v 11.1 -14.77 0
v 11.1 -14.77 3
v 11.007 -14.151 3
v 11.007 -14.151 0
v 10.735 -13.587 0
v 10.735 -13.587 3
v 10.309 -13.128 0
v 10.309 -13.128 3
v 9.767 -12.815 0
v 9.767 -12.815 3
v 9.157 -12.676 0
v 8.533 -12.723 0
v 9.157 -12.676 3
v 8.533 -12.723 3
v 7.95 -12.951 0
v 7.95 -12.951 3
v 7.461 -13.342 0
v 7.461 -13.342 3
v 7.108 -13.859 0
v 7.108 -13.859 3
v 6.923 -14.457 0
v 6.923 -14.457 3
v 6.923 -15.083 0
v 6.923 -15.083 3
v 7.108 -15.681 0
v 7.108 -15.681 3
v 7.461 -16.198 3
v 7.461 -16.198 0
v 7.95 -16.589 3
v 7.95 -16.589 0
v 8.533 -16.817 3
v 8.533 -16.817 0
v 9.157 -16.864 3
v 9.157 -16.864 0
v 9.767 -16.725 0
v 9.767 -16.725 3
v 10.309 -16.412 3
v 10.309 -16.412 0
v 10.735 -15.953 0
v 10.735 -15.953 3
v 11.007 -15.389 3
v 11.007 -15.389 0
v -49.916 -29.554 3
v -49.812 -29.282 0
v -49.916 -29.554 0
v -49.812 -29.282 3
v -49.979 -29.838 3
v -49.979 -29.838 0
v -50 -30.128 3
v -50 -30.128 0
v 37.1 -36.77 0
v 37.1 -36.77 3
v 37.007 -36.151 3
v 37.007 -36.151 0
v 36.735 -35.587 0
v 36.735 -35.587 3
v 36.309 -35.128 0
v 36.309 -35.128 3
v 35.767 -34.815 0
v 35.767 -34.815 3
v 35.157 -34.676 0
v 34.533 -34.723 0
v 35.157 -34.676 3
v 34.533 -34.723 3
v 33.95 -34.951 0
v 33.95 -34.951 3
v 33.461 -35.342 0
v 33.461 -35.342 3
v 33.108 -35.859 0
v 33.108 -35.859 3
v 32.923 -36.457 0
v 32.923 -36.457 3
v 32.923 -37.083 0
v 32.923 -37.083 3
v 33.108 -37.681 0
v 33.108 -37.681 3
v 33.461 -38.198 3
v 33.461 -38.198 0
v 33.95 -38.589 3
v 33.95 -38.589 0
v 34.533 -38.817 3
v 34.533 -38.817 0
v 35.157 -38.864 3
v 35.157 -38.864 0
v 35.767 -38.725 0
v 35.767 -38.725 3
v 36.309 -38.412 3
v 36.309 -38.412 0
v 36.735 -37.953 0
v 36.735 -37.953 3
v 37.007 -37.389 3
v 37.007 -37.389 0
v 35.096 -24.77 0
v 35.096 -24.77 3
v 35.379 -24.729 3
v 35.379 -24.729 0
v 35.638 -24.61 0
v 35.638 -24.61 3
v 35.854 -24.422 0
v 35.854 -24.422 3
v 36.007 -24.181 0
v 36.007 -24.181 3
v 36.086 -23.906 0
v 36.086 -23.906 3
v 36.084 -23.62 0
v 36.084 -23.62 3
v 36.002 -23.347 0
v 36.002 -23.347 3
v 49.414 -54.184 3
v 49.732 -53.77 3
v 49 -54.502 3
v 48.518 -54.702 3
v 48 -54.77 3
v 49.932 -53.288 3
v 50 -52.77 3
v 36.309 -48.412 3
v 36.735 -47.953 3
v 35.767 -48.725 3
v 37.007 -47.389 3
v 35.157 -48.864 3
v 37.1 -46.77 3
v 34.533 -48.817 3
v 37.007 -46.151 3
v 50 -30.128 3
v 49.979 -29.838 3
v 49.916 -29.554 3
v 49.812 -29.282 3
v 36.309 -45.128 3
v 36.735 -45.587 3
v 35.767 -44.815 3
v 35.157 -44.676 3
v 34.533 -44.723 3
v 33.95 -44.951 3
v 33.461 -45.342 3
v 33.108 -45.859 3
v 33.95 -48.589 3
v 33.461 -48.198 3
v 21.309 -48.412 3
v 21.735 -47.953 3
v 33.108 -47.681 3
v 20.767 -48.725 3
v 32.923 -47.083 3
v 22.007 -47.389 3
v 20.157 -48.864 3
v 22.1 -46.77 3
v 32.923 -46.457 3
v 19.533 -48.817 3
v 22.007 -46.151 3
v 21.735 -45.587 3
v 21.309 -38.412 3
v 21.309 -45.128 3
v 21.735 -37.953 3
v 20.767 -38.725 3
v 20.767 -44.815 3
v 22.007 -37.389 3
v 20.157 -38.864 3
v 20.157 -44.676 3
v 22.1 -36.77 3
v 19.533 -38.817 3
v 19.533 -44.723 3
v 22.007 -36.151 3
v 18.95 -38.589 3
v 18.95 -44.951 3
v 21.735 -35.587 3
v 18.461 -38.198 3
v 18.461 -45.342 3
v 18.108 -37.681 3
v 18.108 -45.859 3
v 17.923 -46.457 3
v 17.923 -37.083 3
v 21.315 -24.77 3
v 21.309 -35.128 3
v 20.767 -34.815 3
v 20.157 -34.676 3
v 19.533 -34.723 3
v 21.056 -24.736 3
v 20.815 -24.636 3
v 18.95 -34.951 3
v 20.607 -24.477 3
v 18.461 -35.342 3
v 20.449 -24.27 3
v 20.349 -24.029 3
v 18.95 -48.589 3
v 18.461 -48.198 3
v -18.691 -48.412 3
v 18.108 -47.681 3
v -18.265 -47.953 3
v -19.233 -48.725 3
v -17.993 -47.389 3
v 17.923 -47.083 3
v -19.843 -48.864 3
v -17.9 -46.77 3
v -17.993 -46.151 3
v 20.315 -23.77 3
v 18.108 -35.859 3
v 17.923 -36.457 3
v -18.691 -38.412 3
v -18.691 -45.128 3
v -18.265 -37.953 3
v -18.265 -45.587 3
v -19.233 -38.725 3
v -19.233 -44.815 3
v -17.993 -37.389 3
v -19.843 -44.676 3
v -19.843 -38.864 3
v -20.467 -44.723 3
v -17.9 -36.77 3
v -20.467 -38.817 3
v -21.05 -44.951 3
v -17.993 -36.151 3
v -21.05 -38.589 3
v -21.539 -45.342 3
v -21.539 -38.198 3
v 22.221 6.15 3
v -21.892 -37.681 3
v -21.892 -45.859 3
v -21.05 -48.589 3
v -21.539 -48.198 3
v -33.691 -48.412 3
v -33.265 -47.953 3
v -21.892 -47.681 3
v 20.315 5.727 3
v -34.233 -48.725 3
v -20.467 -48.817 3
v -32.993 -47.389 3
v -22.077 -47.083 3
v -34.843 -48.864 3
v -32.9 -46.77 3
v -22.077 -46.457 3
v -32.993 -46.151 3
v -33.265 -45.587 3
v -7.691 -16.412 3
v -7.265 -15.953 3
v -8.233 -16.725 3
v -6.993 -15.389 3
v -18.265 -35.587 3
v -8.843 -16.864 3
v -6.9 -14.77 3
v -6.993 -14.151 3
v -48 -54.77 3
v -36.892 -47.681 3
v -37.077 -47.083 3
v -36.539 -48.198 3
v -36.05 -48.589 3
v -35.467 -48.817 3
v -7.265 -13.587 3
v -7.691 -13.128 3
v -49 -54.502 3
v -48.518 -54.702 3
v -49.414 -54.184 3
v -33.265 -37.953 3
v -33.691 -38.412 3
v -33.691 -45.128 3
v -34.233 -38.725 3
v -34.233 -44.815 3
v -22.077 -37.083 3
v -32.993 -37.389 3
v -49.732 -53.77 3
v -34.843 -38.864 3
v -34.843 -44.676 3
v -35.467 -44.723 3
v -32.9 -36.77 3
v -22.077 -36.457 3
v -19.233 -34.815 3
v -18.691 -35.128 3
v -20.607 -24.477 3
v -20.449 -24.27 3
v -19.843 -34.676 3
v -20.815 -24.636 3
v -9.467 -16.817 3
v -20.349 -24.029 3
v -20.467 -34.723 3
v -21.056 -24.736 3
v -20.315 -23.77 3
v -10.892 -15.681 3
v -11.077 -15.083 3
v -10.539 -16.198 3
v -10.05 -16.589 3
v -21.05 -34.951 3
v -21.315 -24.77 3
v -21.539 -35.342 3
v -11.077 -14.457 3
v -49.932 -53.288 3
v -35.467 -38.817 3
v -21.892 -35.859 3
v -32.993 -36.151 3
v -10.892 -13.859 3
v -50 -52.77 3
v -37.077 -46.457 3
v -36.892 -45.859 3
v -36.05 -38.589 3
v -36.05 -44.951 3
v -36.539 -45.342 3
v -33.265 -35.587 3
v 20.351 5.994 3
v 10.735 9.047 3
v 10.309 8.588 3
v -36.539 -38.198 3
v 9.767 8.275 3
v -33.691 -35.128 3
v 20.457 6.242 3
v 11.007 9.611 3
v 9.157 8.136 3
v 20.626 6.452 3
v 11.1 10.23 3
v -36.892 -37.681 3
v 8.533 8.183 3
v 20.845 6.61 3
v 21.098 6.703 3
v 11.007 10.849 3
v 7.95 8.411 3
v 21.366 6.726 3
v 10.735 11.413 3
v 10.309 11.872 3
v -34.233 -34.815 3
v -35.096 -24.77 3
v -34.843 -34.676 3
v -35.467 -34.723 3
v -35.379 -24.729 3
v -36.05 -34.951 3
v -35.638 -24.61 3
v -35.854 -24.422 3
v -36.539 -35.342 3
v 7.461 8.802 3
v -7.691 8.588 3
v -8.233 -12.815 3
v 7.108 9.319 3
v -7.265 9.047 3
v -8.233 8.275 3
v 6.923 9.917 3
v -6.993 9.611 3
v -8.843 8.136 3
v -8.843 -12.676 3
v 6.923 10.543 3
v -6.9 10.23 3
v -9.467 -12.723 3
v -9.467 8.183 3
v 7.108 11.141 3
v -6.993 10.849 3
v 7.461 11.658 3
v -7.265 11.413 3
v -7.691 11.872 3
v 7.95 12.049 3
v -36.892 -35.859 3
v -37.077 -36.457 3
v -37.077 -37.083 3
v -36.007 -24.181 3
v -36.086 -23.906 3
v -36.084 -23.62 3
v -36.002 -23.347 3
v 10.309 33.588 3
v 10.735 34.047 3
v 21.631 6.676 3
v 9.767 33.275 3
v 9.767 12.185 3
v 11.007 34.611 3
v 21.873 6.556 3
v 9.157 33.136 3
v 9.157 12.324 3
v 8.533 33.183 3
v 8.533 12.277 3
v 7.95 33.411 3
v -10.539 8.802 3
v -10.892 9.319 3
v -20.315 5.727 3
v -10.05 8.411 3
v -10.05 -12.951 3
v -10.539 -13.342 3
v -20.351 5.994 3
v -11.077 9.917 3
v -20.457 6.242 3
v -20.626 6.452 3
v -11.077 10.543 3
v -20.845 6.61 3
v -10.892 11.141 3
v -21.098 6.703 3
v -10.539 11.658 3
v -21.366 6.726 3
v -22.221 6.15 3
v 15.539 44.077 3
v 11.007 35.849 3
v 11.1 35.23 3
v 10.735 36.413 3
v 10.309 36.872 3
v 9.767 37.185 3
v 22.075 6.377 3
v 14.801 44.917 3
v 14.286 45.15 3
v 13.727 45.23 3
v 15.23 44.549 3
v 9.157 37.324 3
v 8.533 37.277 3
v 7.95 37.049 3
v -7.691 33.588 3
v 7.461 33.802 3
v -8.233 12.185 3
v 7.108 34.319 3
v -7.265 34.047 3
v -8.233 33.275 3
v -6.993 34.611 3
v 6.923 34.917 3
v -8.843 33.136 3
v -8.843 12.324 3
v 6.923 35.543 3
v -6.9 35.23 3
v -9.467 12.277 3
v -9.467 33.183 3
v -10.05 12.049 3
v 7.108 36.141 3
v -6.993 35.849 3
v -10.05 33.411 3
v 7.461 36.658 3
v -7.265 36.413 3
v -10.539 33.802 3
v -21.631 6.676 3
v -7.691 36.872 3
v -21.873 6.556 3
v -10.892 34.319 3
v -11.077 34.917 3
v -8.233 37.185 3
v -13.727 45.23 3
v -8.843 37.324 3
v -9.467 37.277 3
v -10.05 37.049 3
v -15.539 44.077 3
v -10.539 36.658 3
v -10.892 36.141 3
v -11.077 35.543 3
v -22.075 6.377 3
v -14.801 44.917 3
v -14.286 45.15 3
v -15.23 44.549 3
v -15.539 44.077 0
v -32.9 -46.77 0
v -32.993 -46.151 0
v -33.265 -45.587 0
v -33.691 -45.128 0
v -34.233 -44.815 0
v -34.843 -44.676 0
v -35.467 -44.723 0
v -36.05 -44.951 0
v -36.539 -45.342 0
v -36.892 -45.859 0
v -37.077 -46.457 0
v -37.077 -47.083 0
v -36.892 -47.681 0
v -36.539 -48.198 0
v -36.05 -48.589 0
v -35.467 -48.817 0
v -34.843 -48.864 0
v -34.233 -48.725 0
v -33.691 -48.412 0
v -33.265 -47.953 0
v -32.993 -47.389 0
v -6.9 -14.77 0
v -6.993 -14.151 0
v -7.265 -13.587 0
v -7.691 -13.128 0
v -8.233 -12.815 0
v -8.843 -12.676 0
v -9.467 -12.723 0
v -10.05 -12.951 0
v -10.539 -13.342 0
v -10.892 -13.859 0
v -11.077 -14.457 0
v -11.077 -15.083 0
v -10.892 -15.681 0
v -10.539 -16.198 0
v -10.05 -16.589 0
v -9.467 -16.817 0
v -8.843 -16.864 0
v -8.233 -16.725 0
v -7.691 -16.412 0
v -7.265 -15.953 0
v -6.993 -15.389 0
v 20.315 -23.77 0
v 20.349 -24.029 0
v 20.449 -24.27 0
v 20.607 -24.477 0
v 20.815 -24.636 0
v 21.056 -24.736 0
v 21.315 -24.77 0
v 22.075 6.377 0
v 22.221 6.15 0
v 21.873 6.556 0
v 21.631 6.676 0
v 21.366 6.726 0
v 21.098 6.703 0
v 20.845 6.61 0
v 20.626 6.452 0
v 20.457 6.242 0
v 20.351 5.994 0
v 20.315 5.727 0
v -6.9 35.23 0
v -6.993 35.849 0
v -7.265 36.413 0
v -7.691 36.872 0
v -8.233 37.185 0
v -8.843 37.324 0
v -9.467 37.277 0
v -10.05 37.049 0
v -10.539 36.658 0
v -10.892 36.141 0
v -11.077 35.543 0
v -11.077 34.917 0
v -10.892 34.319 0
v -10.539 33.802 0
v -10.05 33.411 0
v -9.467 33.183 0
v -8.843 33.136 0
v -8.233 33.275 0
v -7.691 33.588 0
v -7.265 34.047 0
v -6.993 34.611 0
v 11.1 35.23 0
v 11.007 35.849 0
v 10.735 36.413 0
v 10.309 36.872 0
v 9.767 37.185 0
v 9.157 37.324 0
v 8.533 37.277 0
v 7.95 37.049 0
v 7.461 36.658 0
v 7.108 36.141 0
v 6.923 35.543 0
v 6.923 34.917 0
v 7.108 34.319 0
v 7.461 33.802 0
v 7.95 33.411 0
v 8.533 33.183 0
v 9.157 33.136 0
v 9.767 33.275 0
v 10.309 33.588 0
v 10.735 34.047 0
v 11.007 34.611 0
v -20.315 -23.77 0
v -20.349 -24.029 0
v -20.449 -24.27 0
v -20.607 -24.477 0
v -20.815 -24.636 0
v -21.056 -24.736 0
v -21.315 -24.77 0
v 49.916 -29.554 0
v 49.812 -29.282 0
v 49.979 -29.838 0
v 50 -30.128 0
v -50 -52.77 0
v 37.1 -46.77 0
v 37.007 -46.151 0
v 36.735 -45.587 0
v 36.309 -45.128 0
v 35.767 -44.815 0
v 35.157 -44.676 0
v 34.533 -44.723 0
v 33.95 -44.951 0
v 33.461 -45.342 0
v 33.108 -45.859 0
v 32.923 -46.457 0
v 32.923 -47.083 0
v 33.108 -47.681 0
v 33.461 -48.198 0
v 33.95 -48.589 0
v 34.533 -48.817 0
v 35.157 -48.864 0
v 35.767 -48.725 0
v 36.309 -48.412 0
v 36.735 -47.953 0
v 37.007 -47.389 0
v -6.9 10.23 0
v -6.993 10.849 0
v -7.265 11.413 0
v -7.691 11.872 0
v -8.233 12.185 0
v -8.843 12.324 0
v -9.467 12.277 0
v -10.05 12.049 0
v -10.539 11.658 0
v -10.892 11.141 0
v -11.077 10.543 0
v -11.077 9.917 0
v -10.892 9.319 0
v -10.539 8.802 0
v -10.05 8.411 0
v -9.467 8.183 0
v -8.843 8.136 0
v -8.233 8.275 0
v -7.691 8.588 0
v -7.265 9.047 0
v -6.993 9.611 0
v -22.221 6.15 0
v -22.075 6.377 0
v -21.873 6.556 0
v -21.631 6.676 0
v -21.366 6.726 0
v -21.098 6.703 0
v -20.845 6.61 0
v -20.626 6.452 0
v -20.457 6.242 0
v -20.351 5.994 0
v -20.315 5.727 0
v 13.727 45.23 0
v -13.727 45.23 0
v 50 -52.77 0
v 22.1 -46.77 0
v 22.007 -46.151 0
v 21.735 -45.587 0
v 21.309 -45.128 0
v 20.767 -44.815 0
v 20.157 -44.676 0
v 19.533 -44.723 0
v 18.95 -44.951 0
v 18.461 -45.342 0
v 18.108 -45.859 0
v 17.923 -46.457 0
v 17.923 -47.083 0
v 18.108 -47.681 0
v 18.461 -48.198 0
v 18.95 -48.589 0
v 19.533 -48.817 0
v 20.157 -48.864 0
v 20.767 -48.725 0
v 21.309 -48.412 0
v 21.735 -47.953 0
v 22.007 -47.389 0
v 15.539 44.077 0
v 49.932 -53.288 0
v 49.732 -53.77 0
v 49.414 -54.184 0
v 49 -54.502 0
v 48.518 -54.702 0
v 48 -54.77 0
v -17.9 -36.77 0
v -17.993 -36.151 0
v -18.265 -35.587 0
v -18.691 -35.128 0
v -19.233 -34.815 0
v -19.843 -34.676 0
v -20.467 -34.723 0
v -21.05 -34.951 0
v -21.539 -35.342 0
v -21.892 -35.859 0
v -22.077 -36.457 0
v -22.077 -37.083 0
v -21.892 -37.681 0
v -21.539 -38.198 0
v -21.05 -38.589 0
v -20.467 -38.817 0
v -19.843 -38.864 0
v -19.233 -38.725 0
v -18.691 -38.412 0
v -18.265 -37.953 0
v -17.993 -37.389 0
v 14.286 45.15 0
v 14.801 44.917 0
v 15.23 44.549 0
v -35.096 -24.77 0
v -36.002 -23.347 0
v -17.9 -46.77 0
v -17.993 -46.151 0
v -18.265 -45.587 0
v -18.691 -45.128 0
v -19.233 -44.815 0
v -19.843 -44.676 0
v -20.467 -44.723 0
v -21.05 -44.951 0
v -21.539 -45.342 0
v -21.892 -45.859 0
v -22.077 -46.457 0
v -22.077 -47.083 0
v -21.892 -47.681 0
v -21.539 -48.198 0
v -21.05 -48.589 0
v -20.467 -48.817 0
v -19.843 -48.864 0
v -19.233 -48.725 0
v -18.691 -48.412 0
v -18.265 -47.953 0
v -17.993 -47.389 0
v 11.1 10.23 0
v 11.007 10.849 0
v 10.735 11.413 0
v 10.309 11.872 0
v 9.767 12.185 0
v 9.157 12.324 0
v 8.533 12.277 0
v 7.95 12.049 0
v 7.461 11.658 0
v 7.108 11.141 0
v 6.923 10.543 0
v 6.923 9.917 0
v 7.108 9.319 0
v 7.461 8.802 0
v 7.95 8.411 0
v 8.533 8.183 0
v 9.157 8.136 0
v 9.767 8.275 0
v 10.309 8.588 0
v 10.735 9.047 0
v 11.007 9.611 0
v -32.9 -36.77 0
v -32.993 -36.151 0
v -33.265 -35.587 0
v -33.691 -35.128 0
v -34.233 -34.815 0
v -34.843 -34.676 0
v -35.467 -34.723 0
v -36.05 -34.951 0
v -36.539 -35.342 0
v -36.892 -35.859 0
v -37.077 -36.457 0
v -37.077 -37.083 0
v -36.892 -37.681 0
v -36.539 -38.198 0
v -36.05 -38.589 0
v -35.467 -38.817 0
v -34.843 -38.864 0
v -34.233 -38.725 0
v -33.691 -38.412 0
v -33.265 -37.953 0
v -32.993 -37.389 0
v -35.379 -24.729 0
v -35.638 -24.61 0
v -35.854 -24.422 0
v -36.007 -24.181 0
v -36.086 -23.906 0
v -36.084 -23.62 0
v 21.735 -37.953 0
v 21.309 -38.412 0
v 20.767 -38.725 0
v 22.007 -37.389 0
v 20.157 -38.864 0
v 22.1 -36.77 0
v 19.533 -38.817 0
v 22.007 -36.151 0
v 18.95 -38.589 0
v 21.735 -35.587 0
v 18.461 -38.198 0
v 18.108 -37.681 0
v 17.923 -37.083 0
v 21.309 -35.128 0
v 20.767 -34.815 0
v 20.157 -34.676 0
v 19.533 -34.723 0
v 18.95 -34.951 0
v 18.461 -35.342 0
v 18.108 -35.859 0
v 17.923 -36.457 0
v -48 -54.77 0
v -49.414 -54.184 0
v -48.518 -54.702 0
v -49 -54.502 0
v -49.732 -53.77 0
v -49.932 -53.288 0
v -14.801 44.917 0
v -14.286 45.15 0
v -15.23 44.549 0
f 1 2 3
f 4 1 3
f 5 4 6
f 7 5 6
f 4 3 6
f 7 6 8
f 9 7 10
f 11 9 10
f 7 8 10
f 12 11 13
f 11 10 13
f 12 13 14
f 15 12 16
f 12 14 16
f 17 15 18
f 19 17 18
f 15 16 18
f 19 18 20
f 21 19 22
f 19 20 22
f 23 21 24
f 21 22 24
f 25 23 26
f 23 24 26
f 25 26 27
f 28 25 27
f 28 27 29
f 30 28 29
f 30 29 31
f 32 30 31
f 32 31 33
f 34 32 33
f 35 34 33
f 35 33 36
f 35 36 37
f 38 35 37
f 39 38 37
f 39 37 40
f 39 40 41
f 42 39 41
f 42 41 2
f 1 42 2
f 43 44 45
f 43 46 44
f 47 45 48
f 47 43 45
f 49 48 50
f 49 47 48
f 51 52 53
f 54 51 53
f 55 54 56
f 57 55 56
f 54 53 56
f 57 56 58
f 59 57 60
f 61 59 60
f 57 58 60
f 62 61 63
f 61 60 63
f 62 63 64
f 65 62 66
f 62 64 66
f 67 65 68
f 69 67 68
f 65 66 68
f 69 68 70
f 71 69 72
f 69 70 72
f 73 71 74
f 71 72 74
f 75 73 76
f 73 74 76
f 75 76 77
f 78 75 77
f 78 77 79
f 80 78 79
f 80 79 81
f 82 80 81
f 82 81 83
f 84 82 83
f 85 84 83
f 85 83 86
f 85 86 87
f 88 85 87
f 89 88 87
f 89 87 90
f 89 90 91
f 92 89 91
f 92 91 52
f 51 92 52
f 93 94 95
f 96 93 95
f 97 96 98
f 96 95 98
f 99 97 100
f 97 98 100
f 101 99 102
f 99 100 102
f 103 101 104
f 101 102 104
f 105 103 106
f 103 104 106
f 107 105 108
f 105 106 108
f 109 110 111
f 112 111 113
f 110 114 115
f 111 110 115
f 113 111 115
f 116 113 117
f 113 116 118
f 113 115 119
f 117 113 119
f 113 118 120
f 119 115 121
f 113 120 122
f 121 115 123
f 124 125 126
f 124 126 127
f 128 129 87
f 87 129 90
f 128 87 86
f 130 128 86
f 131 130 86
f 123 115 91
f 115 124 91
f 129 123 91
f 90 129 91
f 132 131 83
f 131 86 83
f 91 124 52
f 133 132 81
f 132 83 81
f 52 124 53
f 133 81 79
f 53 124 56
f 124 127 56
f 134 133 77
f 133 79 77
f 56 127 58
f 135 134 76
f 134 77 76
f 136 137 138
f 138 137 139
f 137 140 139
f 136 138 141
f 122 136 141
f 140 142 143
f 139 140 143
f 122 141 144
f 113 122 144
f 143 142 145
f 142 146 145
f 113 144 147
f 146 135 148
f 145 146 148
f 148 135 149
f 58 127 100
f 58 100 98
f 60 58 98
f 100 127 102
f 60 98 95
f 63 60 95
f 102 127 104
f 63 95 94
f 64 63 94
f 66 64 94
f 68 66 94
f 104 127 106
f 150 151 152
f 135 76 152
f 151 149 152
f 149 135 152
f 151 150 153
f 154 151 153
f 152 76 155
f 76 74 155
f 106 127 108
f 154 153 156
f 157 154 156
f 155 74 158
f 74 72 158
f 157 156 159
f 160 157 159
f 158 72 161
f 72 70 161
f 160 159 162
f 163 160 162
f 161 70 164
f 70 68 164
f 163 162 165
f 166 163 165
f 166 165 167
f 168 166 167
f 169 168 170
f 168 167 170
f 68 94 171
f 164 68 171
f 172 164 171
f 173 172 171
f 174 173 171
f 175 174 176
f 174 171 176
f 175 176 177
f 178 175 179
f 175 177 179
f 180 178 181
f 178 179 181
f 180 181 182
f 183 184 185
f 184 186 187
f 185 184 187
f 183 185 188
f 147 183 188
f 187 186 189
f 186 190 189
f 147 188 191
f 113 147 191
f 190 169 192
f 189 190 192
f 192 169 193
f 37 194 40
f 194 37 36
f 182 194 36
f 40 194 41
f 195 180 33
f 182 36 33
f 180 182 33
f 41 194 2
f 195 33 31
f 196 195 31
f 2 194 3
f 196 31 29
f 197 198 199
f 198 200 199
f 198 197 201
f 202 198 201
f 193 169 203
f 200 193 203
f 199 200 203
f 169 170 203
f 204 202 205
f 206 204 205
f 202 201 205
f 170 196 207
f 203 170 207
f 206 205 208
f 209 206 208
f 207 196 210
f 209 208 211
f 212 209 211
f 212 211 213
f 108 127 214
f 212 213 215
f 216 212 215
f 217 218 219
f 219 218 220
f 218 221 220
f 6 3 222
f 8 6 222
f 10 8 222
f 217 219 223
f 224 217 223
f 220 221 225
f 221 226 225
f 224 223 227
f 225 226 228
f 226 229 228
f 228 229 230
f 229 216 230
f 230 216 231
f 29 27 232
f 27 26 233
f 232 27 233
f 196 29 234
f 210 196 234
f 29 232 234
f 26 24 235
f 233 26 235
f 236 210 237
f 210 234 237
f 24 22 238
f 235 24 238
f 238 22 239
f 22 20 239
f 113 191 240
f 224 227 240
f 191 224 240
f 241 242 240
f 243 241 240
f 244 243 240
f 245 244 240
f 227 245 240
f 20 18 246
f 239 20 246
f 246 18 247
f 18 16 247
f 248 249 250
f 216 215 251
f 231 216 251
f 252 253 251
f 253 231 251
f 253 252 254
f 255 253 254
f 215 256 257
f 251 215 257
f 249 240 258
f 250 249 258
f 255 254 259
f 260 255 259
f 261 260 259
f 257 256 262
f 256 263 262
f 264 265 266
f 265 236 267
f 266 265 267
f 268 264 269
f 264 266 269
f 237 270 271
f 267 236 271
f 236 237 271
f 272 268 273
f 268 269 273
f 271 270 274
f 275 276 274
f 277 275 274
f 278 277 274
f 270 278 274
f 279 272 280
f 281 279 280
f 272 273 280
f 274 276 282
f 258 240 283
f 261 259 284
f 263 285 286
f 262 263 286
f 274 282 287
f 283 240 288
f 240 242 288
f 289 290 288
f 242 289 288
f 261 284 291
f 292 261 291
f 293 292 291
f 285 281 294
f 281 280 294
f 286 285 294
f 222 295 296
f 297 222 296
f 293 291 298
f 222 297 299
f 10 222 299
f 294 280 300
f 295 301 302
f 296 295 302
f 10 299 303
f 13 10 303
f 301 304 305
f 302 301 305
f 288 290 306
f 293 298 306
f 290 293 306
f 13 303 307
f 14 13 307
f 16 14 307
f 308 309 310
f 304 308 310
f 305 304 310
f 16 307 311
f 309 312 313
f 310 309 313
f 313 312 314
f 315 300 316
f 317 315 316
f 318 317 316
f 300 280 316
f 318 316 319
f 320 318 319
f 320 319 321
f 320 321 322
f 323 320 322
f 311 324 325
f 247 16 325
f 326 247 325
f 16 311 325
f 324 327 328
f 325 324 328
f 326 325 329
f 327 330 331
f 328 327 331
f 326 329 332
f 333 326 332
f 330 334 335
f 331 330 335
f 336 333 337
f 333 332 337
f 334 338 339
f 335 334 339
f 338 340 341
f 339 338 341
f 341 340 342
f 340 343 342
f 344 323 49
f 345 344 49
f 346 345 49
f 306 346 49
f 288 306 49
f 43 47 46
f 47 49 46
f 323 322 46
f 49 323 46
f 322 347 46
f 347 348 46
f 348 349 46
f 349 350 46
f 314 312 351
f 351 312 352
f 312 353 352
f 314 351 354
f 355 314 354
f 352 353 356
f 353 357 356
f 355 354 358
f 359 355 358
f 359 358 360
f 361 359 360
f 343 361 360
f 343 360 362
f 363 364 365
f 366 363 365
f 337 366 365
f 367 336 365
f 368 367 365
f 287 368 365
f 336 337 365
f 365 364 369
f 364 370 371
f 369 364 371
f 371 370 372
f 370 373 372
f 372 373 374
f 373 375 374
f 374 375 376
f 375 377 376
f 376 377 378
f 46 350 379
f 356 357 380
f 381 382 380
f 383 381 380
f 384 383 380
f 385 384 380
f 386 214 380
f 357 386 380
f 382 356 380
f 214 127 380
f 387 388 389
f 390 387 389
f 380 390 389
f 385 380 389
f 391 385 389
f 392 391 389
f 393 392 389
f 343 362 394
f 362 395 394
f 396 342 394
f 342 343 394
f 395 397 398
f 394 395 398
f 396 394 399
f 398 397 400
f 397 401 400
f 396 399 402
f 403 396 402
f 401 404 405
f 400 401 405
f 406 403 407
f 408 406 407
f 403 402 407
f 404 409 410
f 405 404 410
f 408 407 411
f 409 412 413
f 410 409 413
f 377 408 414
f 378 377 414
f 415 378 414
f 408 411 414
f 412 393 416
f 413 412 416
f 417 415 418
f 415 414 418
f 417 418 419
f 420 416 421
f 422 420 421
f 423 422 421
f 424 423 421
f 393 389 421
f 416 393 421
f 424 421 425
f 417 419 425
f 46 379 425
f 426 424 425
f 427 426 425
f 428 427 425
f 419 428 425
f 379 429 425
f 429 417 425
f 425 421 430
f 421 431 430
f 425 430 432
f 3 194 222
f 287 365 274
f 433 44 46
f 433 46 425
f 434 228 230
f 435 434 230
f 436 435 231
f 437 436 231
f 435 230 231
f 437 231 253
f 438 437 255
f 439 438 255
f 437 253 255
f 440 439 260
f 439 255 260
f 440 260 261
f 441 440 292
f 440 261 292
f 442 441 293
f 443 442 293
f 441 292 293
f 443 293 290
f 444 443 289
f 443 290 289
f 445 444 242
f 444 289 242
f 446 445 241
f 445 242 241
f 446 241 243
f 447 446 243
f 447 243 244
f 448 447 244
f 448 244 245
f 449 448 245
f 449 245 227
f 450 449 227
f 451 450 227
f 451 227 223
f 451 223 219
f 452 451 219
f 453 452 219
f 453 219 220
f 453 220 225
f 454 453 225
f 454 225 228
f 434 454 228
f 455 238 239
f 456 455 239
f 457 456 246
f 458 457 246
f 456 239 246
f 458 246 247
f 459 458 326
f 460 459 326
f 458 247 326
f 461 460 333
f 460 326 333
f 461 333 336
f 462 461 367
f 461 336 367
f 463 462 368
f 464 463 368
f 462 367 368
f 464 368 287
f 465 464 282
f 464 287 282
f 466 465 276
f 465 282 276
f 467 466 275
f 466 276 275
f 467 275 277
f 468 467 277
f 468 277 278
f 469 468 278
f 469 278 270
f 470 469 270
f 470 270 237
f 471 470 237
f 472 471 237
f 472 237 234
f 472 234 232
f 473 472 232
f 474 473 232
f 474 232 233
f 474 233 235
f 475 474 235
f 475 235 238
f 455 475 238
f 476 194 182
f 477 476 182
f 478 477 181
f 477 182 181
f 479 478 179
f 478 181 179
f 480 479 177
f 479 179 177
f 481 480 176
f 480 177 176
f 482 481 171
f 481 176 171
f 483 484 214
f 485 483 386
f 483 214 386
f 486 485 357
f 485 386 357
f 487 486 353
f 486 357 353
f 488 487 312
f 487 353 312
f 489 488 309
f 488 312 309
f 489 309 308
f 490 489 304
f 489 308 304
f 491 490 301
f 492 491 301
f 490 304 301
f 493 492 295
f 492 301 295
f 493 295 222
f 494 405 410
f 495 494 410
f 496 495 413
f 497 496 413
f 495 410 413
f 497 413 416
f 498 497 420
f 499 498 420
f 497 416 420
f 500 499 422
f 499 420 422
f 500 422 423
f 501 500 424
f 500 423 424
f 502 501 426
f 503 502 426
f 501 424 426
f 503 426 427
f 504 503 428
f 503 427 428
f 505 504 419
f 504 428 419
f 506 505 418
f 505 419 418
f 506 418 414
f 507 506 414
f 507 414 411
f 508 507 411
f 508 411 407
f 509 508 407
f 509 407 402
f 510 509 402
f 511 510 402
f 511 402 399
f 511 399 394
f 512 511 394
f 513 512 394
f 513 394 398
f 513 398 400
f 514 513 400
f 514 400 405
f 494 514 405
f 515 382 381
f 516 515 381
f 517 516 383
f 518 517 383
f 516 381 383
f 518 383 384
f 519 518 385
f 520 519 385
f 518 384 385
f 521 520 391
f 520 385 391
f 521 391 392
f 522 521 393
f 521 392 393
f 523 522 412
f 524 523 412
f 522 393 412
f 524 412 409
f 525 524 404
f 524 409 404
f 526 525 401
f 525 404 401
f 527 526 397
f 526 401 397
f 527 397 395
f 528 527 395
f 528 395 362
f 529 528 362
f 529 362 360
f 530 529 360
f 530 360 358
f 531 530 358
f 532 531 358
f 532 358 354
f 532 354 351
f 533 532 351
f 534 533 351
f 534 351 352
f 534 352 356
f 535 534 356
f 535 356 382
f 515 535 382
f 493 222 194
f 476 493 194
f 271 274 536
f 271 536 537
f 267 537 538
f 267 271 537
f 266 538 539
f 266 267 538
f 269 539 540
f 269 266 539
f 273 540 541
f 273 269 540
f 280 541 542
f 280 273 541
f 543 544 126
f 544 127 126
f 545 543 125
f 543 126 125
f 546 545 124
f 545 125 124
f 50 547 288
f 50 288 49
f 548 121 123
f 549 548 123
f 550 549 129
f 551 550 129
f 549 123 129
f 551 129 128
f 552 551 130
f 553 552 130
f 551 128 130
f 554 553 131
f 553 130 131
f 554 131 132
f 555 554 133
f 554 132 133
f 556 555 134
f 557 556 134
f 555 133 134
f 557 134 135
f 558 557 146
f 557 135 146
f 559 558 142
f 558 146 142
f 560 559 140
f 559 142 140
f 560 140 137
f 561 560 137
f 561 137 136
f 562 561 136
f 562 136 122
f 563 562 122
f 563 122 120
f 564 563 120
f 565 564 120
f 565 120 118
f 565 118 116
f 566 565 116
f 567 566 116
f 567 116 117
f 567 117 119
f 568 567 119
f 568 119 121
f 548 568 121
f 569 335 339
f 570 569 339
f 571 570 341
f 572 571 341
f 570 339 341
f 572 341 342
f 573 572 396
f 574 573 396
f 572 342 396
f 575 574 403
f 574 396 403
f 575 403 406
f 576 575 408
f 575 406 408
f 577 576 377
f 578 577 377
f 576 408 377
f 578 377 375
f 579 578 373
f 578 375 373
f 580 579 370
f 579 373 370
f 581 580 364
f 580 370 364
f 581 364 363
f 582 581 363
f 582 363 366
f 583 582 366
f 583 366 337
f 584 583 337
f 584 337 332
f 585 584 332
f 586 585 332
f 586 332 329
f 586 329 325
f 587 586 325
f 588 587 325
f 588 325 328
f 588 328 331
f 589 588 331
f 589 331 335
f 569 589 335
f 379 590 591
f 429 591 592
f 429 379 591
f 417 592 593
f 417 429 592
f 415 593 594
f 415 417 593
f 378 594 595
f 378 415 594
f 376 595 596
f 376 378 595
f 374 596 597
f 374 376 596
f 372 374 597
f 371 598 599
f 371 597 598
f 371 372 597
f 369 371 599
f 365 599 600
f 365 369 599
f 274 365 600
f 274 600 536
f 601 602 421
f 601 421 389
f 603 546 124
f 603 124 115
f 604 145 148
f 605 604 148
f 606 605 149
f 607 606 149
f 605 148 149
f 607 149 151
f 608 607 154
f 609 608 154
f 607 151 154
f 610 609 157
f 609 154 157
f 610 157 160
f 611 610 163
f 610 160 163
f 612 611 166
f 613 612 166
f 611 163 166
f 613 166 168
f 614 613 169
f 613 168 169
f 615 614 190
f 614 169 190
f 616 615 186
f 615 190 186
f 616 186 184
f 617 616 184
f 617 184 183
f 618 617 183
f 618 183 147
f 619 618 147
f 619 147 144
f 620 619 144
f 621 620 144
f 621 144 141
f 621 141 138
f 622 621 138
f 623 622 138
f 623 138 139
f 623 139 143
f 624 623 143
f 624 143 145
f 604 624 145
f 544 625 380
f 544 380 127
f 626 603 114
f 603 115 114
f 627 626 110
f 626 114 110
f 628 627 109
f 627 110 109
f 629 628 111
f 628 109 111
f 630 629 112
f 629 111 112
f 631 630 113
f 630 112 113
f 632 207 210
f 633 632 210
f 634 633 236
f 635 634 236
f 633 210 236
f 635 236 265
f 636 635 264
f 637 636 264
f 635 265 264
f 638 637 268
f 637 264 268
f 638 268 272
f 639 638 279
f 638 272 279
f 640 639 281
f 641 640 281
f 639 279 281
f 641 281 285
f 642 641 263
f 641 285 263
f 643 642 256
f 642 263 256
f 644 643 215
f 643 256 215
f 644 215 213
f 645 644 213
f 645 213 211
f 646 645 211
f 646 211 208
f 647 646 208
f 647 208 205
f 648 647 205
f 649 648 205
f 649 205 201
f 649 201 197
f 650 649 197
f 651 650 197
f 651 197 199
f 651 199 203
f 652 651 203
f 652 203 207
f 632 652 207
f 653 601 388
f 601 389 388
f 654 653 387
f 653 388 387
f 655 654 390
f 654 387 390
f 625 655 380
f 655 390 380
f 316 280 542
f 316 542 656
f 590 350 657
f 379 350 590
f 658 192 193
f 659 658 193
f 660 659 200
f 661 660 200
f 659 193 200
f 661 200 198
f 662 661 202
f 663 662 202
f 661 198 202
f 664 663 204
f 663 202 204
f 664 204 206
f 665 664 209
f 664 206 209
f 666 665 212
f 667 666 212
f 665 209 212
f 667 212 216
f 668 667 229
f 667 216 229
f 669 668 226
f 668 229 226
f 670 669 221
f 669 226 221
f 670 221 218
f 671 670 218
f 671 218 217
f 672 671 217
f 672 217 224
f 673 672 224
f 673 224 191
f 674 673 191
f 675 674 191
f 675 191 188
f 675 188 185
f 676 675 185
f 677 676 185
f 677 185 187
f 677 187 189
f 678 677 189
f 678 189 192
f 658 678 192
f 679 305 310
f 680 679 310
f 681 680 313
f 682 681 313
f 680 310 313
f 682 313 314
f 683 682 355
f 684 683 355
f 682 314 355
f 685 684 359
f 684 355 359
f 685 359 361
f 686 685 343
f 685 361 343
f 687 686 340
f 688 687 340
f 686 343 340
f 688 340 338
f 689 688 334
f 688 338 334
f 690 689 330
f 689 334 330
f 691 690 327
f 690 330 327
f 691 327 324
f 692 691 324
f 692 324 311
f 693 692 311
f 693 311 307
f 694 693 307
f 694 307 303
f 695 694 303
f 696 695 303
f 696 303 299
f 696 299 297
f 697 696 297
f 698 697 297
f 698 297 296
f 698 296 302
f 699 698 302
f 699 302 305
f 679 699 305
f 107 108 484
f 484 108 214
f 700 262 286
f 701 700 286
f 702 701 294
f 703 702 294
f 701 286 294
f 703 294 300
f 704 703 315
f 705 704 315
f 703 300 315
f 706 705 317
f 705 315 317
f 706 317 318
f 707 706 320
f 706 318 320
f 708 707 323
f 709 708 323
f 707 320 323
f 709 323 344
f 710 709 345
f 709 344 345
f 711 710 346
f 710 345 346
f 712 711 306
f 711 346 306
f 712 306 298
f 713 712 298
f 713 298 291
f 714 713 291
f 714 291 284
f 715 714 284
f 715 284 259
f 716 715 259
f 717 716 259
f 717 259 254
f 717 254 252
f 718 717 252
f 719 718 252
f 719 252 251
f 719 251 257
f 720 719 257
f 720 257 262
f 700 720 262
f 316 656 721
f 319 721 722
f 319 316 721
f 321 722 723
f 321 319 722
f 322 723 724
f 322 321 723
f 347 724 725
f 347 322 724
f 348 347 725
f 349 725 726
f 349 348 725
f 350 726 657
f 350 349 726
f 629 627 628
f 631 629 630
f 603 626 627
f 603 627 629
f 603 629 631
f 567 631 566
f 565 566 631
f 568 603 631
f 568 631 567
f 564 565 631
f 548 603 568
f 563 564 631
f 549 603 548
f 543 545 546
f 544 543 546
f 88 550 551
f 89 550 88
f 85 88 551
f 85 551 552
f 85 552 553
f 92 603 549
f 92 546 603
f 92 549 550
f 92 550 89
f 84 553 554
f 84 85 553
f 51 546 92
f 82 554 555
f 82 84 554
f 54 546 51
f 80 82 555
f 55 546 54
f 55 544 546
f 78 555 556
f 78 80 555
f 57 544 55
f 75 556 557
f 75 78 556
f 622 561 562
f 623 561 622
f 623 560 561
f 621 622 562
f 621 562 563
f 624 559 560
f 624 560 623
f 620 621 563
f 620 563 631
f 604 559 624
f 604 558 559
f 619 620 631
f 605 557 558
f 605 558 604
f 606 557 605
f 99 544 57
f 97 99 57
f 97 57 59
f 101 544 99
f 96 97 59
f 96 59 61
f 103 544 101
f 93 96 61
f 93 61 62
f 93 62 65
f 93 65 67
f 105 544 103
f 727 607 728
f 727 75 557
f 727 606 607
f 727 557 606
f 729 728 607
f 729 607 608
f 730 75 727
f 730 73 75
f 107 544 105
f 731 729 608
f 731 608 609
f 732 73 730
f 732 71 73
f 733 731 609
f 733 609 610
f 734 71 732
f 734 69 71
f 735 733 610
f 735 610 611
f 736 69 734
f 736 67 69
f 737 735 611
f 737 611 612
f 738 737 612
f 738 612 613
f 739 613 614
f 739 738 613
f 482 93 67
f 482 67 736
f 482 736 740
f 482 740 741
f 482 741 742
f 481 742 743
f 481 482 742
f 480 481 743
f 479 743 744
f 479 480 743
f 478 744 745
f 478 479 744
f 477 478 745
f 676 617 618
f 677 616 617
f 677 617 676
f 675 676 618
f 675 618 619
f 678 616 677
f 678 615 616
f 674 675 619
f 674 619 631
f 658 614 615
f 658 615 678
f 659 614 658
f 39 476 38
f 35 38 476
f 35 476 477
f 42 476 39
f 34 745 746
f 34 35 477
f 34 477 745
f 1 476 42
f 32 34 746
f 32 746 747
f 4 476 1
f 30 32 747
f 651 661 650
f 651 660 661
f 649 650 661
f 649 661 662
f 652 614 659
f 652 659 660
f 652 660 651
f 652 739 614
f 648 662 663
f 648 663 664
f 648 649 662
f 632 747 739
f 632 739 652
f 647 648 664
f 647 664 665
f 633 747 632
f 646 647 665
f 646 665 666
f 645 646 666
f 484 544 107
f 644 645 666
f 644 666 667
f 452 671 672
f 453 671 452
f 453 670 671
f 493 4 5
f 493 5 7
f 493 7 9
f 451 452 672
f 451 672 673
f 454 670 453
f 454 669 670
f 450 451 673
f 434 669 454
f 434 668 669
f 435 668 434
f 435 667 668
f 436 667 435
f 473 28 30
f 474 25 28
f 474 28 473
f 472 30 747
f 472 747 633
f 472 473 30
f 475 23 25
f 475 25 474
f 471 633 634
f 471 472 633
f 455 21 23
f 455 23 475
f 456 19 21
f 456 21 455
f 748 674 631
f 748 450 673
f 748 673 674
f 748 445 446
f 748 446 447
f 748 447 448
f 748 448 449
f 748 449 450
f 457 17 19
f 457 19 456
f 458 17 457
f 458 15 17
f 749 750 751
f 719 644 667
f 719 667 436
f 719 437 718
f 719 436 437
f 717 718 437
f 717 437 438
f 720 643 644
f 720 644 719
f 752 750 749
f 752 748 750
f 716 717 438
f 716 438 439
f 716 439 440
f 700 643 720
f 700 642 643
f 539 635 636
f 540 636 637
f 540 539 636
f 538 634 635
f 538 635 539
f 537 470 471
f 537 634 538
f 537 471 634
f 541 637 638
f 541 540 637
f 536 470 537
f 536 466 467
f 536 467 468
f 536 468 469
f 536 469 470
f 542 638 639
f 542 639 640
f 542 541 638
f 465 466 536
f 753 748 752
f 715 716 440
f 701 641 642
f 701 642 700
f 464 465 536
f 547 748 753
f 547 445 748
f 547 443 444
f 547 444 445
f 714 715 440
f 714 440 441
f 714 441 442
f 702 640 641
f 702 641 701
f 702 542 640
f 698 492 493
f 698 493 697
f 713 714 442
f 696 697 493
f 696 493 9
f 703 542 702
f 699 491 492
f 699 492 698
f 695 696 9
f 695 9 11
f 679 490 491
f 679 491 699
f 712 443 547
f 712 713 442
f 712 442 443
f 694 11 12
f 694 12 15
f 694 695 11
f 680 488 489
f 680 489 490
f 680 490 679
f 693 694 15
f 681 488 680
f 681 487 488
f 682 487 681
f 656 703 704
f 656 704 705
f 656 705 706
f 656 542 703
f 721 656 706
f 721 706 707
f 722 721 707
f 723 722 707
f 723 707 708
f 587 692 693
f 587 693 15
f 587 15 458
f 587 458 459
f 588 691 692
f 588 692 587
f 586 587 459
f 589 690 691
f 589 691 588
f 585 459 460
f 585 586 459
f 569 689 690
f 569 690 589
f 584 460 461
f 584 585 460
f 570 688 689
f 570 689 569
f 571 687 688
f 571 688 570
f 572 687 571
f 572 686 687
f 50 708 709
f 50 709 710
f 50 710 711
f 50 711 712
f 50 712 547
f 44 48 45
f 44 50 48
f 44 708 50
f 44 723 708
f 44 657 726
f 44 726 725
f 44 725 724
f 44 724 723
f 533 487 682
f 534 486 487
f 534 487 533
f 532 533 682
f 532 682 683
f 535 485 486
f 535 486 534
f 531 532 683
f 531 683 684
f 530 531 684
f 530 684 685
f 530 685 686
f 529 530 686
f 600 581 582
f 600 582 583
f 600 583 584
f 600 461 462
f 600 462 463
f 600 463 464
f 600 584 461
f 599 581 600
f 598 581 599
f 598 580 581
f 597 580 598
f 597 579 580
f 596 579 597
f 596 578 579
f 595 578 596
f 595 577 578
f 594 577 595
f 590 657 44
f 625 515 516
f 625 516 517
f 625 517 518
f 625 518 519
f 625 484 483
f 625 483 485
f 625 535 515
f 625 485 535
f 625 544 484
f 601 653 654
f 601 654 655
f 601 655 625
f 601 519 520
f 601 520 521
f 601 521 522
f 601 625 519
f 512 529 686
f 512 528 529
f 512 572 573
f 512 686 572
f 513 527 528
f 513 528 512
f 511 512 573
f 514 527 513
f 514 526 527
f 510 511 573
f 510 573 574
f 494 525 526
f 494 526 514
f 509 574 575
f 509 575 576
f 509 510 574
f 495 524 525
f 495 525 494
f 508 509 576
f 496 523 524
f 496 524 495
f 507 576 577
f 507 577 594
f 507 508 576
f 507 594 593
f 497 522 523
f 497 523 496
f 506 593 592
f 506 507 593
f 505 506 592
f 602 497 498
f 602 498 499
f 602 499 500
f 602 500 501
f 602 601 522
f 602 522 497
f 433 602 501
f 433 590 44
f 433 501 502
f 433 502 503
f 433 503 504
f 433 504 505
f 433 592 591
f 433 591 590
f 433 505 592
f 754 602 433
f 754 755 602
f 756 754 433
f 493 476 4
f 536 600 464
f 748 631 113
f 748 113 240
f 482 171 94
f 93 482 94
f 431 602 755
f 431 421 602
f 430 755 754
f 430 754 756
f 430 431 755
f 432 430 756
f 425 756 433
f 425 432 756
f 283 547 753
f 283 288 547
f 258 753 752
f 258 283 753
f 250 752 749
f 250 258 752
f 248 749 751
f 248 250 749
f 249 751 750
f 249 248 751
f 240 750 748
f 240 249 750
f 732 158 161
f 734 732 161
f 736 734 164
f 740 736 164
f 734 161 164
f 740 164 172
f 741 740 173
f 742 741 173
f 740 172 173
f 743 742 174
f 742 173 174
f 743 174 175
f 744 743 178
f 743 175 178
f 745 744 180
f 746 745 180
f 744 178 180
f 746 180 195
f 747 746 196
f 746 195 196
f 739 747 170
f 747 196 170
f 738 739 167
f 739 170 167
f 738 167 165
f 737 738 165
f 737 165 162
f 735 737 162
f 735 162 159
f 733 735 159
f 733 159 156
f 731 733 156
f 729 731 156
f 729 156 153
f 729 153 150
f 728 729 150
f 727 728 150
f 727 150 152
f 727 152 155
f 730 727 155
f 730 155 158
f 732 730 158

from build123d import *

# Parameters (mm, degrees)
EXTRUDE_1_DEPTH     = 3
CUT_EXTRUDE_2_REACH = 76.221
SKETCH_2_R          = 2.1
FILLET_1_R          = 2


with BuildPart() as part:
    # 草图1 → 凸台-拉伸1 (new body)
    with BuildSketch(Plane.XY):
        Polygon((-15, 45.229945154), (15, 45.229945154), (50, -29.684017461), (50, -54.770054846), (-50, -54.770054846), (-50, -29.684017461), align=None)
    extrude(amount=EXTRUDE_1_DEPTH)

    # 草图2 → 切除-拉伸2 (cut, up to next)
    with BuildSketch(Plane.XY.offset(3), mode=Mode.PRIVATE) as cut_extrude_2_sk1:
        with Locations((-9, 35.229945154)):
            Circle(SKETCH_2_R)
    cut_extrude_2_tool1 = extrude(cut_extrude_2_sk1.sketch, amount=-CUT_EXTRUDE_2_REACH, mode=Mode.PRIVATE) & part.part
    # 草图2 → 切除-拉伸2 (cut, up to next)
    with BuildSketch(Plane.XY.offset(3), mode=Mode.PRIVATE) as cut_extrude_2_sk2:
        with Locations((9, 35.229945154)):
            Circle(SKETCH_2_R)
    cut_extrude_2_tool2 = extrude(cut_extrude_2_sk2.sketch, amount=-CUT_EXTRUDE_2_REACH, mode=Mode.PRIVATE) & part.part
    # 草图2 → 切除-拉伸2 (cut, up to next)
    with BuildSketch(Plane.XY.offset(3), mode=Mode.PRIVATE) as cut_extrude_2_sk3:
        with Locations((9, 10.229945154)):
            Circle(SKETCH_2_R)
    cut_extrude_2_tool3 = extrude(cut_extrude_2_sk3.sketch, amount=-CUT_EXTRUDE_2_REACH, mode=Mode.PRIVATE) & part.part
    # 草图2 → 切除-拉伸2 (cut, up to next)
    with BuildSketch(Plane.XY.offset(3), mode=Mode.PRIVATE) as cut_extrude_2_sk4:
        with Locations((-9, 10.229945154)):
            Circle(SKETCH_2_R)
    cut_extrude_2_tool4 = extrude(cut_extrude_2_sk4.sketch, amount=-CUT_EXTRUDE_2_REACH, mode=Mode.PRIVATE) & part.part
    # 草图2 → 切除-拉伸2 (cut, up to next)
    with BuildSketch(Plane.XY.offset(3), mode=Mode.PRIVATE) as cut_extrude_2_sk5:
        with Locations((-20, -36.770054846)):
            Circle(SKETCH_2_R)
    cut_extrude_2_tool5 = extrude(cut_extrude_2_sk5.sketch, amount=-CUT_EXTRUDE_2_REACH, mode=Mode.PRIVATE) & part.part
    # 草图2 → 切除-拉伸2 (cut, up to next)
    with BuildSketch(Plane.XY.offset(3), mode=Mode.PRIVATE) as cut_extrude_2_sk6:
        with Locations((-20, -46.770054846)):
            Circle(SKETCH_2_R)
    cut_extrude_2_tool6 = extrude(cut_extrude_2_sk6.sketch, amount=-CUT_EXTRUDE_2_REACH, mode=Mode.PRIVATE) & part.part
    # 草图2 → 切除-拉伸2 (cut, up to next)
    with BuildSketch(Plane.XY.offset(3), mode=Mode.PRIVATE) as cut_extrude_2_sk7:
        with Locations((20, -46.770054846)):
            Circle(SKETCH_2_R)
    cut_extrude_2_tool7 = extrude(cut_extrude_2_sk7.sketch, amount=-CUT_EXTRUDE_2_REACH, mode=Mode.PRIVATE) & part.part
    # 草图2 → 切除-拉伸2 (cut, up to next)
    with BuildSketch(Plane.XY.offset(3), mode=Mode.PRIVATE) as cut_extrude_2_sk8:
        with Locations((20, -36.770054846)):
            Circle(SKETCH_2_R)
    cut_extrude_2_tool8 = extrude(cut_extrude_2_sk8.sketch, amount=-CUT_EXTRUDE_2_REACH, mode=Mode.PRIVATE) & part.part
    # 草图2 → 切除-拉伸2 (cut, up to next)
    with BuildSketch(Plane.XY.offset(3), mode=Mode.PRIVATE) as cut_extrude_2_sk9:
        with Locations((-9, -14.770054846)):
            Circle(SKETCH_2_R)
    cut_extrude_2_tool9 = extrude(cut_extrude_2_sk9.sketch, amount=-CUT_EXTRUDE_2_REACH, mode=Mode.PRIVATE) & part.part
    # 草图2 → 切除-拉伸2 (cut, up to next)
    with BuildSketch(Plane.XY.offset(3), mode=Mode.PRIVATE) as cut_extrude_2_sk10:
        with Locations((9, -14.770054846)):
            Circle(SKETCH_2_R)
    cut_extrude_2_tool10 = extrude(cut_extrude_2_sk10.sketch, amount=-CUT_EXTRUDE_2_REACH, mode=Mode.PRIVATE) & part.part
    # 草图2 → 切除-拉伸2 (cut, up to next)
    with BuildSketch(Plane.XY.offset(3), mode=Mode.PRIVATE) as cut_extrude_2_sk11:
        with Locations((-35, -36.770054846)):
            Circle(SKETCH_2_R)
    cut_extrude_2_tool11 = extrude(cut_extrude_2_sk11.sketch, amount=-CUT_EXTRUDE_2_REACH, mode=Mode.PRIVATE) & part.part
    # 草图2 → 切除-拉伸2 (cut, up to next)
    with BuildSketch(Plane.XY.offset(3), mode=Mode.PRIVATE) as cut_extrude_2_sk12:
        with Locations((-35, -46.770054846)):
            Circle(SKETCH_2_R)
    cut_extrude_2_tool12 = extrude(cut_extrude_2_sk12.sketch, amount=-CUT_EXTRUDE_2_REACH, mode=Mode.PRIVATE) & part.part
    # 草图2 → 切除-拉伸2 (cut, up to next)
    with BuildSketch(Plane.XY.offset(3), mode=Mode.PRIVATE) as cut_extrude_2_sk13:
        with Locations((35, -36.770054846)):
            Circle(SKETCH_2_R)
    cut_extrude_2_tool13 = extrude(cut_extrude_2_sk13.sketch, amount=-CUT_EXTRUDE_2_REACH, mode=Mode.PRIVATE) & part.part
    # 草图2 → 切除-拉伸2 (cut, up to next)
    with BuildSketch(Plane.XY.offset(3), mode=Mode.PRIVATE) as cut_extrude_2_sk14:
        with Locations((35, -46.770054846)):
            Circle(SKETCH_2_R)
    cut_extrude_2_tool14 = extrude(cut_extrude_2_sk14.sketch, amount=-CUT_EXTRUDE_2_REACH, mode=Mode.PRIVATE) & part.part
    # 草图2 → 切除-拉伸2 (cut, up to next)
    with BuildSketch(Plane.XY.offset(3), mode=Mode.PRIVATE) as cut_extrude_2_sk15:
        with BuildLine():
            Line((-20.314527419, 5.727067103), (-20.314527419, -23.770054846))
            ThreePointArc((-20.314527419, -23.770054846), (-20.607420638, -24.477161627), (-21.314527419, -24.770054846))
            Line((-21.314527419, -24.770054846), (-35.09566023, -24.770054846))
            ThreePointArc((-35.09566023, -24.770054846), (-35.939249041, -24.307044527), (-36.001657204, -23.346770682))
            Line((-36.001657204, -23.346770682), (-22.220524392, 6.150351268))
            ThreePointArc((-22.220524392, 6.150351268), (-21.097729095, 6.703283517), (-20.314527419, 5.727067103))
        make_face()
    cut_extrude_2_tool15 = extrude(cut_extrude_2_sk15.sketch, amount=-CUT_EXTRUDE_2_REACH, mode=Mode.PRIVATE) & part.part
    # 草图2 → 切除-拉伸2 (cut, up to next)
    with BuildSketch(Plane.XY.offset(3), mode=Mode.PRIVATE) as cut_extrude_2_sk16:
        with BuildLine():
            Line((36.001657204, -23.346770682), (22.220524392, 6.150351268))
            ThreePointArc((22.220524392, 6.150351268), (21.097729095, 6.703283517), (20.314527419, 5.727067103))
            Line((20.314527419, 5.727067103), (20.314527419, -23.770054846))
            ThreePointArc((20.314527419, -23.770054846), (20.607420638, -24.477161627), (21.314527419, -24.770054846))
            Line((21.314527419, -24.770054846), (35.09566023, -24.770054846))
            ThreePointArc((35.09566023, -24.770054846), (35.939249041, -24.307044527), (36.001657204, -23.346770682))
        make_face()
    cut_extrude_2_tool16 = extrude(cut_extrude_2_sk16.sketch, amount=-CUT_EXTRUDE_2_REACH, mode=Mode.PRIVATE) & part.part
    add(cut_extrude_2_tool1.solids().sort_by_distance((-9, 35.229945, 3))[0], mode=Mode.SUBTRACT)
    add(cut_extrude_2_tool2.solids().sort_by_distance((9, 35.229945, 3))[0], mode=Mode.SUBTRACT)
    add(cut_extrude_2_tool3.solids().sort_by_distance((9, 10.229945, 3))[0], mode=Mode.SUBTRACT)
    add(cut_extrude_2_tool4.solids().sort_by_distance((-9, 10.229945, 3))[0], mode=Mode.SUBTRACT)
    add(cut_extrude_2_tool5.solids().sort_by_distance((-20, -36.770055, 3))[0], mode=Mode.SUBTRACT)
    add(cut_extrude_2_tool6.solids().sort_by_distance((-20, -46.770055, 3))[0], mode=Mode.SUBTRACT)
    add(cut_extrude_2_tool7.solids().sort_by_distance((20, -46.770055, 3))[0], mode=Mode.SUBTRACT)
    add(cut_extrude_2_tool8.solids().sort_by_distance((20, -36.770055, 3))[0], mode=Mode.SUBTRACT)
    add(cut_extrude_2_tool9.solids().sort_by_distance((-9, -14.770055, 3))[0], mode=Mode.SUBTRACT)
    add(cut_extrude_2_tool10.solids().sort_by_distance((9, -14.770055, 3))[0], mode=Mode.SUBTRACT)
    add(cut_extrude_2_tool11.solids().sort_by_distance((-35, -36.770055, 3))[0], mode=Mode.SUBTRACT)
    add(cut_extrude_2_tool12.solids().sort_by_distance((-35, -46.770055, 3))[0], mode=Mode.SUBTRACT)
    add(cut_extrude_2_tool13.solids().sort_by_distance((35, -36.770055, 3))[0], mode=Mode.SUBTRACT)
    add(cut_extrude_2_tool14.solids().sort_by_distance((35, -46.770055, 3))[0], mode=Mode.SUBTRACT)
    add(cut_extrude_2_tool15.solids().sort_by_distance((-25.803132, -13.304968, 3))[0], mode=Mode.SUBTRACT)
    add(cut_extrude_2_tool16.solids().sort_by_distance((25.803132, -13.304968, 3))[0], mode=Mode.SUBTRACT)

    # 圆角1
    fillet_1_edges = [part.edges().sort_by_distance(p)[0] for p in [
        (-15, 45.229945154, 1.5),
        (-50, -29.684017461, 1.5),
        (-50, -54.770054846, 1.5),
        (50, -54.770054846, 1.5),
        (50, -29.684017461, 1.5),
        (15, 45.229945154, 1.5),
    ]]
    fillet(fillet_1_edges, radius=FILLET_1_R)


solid = part.part
